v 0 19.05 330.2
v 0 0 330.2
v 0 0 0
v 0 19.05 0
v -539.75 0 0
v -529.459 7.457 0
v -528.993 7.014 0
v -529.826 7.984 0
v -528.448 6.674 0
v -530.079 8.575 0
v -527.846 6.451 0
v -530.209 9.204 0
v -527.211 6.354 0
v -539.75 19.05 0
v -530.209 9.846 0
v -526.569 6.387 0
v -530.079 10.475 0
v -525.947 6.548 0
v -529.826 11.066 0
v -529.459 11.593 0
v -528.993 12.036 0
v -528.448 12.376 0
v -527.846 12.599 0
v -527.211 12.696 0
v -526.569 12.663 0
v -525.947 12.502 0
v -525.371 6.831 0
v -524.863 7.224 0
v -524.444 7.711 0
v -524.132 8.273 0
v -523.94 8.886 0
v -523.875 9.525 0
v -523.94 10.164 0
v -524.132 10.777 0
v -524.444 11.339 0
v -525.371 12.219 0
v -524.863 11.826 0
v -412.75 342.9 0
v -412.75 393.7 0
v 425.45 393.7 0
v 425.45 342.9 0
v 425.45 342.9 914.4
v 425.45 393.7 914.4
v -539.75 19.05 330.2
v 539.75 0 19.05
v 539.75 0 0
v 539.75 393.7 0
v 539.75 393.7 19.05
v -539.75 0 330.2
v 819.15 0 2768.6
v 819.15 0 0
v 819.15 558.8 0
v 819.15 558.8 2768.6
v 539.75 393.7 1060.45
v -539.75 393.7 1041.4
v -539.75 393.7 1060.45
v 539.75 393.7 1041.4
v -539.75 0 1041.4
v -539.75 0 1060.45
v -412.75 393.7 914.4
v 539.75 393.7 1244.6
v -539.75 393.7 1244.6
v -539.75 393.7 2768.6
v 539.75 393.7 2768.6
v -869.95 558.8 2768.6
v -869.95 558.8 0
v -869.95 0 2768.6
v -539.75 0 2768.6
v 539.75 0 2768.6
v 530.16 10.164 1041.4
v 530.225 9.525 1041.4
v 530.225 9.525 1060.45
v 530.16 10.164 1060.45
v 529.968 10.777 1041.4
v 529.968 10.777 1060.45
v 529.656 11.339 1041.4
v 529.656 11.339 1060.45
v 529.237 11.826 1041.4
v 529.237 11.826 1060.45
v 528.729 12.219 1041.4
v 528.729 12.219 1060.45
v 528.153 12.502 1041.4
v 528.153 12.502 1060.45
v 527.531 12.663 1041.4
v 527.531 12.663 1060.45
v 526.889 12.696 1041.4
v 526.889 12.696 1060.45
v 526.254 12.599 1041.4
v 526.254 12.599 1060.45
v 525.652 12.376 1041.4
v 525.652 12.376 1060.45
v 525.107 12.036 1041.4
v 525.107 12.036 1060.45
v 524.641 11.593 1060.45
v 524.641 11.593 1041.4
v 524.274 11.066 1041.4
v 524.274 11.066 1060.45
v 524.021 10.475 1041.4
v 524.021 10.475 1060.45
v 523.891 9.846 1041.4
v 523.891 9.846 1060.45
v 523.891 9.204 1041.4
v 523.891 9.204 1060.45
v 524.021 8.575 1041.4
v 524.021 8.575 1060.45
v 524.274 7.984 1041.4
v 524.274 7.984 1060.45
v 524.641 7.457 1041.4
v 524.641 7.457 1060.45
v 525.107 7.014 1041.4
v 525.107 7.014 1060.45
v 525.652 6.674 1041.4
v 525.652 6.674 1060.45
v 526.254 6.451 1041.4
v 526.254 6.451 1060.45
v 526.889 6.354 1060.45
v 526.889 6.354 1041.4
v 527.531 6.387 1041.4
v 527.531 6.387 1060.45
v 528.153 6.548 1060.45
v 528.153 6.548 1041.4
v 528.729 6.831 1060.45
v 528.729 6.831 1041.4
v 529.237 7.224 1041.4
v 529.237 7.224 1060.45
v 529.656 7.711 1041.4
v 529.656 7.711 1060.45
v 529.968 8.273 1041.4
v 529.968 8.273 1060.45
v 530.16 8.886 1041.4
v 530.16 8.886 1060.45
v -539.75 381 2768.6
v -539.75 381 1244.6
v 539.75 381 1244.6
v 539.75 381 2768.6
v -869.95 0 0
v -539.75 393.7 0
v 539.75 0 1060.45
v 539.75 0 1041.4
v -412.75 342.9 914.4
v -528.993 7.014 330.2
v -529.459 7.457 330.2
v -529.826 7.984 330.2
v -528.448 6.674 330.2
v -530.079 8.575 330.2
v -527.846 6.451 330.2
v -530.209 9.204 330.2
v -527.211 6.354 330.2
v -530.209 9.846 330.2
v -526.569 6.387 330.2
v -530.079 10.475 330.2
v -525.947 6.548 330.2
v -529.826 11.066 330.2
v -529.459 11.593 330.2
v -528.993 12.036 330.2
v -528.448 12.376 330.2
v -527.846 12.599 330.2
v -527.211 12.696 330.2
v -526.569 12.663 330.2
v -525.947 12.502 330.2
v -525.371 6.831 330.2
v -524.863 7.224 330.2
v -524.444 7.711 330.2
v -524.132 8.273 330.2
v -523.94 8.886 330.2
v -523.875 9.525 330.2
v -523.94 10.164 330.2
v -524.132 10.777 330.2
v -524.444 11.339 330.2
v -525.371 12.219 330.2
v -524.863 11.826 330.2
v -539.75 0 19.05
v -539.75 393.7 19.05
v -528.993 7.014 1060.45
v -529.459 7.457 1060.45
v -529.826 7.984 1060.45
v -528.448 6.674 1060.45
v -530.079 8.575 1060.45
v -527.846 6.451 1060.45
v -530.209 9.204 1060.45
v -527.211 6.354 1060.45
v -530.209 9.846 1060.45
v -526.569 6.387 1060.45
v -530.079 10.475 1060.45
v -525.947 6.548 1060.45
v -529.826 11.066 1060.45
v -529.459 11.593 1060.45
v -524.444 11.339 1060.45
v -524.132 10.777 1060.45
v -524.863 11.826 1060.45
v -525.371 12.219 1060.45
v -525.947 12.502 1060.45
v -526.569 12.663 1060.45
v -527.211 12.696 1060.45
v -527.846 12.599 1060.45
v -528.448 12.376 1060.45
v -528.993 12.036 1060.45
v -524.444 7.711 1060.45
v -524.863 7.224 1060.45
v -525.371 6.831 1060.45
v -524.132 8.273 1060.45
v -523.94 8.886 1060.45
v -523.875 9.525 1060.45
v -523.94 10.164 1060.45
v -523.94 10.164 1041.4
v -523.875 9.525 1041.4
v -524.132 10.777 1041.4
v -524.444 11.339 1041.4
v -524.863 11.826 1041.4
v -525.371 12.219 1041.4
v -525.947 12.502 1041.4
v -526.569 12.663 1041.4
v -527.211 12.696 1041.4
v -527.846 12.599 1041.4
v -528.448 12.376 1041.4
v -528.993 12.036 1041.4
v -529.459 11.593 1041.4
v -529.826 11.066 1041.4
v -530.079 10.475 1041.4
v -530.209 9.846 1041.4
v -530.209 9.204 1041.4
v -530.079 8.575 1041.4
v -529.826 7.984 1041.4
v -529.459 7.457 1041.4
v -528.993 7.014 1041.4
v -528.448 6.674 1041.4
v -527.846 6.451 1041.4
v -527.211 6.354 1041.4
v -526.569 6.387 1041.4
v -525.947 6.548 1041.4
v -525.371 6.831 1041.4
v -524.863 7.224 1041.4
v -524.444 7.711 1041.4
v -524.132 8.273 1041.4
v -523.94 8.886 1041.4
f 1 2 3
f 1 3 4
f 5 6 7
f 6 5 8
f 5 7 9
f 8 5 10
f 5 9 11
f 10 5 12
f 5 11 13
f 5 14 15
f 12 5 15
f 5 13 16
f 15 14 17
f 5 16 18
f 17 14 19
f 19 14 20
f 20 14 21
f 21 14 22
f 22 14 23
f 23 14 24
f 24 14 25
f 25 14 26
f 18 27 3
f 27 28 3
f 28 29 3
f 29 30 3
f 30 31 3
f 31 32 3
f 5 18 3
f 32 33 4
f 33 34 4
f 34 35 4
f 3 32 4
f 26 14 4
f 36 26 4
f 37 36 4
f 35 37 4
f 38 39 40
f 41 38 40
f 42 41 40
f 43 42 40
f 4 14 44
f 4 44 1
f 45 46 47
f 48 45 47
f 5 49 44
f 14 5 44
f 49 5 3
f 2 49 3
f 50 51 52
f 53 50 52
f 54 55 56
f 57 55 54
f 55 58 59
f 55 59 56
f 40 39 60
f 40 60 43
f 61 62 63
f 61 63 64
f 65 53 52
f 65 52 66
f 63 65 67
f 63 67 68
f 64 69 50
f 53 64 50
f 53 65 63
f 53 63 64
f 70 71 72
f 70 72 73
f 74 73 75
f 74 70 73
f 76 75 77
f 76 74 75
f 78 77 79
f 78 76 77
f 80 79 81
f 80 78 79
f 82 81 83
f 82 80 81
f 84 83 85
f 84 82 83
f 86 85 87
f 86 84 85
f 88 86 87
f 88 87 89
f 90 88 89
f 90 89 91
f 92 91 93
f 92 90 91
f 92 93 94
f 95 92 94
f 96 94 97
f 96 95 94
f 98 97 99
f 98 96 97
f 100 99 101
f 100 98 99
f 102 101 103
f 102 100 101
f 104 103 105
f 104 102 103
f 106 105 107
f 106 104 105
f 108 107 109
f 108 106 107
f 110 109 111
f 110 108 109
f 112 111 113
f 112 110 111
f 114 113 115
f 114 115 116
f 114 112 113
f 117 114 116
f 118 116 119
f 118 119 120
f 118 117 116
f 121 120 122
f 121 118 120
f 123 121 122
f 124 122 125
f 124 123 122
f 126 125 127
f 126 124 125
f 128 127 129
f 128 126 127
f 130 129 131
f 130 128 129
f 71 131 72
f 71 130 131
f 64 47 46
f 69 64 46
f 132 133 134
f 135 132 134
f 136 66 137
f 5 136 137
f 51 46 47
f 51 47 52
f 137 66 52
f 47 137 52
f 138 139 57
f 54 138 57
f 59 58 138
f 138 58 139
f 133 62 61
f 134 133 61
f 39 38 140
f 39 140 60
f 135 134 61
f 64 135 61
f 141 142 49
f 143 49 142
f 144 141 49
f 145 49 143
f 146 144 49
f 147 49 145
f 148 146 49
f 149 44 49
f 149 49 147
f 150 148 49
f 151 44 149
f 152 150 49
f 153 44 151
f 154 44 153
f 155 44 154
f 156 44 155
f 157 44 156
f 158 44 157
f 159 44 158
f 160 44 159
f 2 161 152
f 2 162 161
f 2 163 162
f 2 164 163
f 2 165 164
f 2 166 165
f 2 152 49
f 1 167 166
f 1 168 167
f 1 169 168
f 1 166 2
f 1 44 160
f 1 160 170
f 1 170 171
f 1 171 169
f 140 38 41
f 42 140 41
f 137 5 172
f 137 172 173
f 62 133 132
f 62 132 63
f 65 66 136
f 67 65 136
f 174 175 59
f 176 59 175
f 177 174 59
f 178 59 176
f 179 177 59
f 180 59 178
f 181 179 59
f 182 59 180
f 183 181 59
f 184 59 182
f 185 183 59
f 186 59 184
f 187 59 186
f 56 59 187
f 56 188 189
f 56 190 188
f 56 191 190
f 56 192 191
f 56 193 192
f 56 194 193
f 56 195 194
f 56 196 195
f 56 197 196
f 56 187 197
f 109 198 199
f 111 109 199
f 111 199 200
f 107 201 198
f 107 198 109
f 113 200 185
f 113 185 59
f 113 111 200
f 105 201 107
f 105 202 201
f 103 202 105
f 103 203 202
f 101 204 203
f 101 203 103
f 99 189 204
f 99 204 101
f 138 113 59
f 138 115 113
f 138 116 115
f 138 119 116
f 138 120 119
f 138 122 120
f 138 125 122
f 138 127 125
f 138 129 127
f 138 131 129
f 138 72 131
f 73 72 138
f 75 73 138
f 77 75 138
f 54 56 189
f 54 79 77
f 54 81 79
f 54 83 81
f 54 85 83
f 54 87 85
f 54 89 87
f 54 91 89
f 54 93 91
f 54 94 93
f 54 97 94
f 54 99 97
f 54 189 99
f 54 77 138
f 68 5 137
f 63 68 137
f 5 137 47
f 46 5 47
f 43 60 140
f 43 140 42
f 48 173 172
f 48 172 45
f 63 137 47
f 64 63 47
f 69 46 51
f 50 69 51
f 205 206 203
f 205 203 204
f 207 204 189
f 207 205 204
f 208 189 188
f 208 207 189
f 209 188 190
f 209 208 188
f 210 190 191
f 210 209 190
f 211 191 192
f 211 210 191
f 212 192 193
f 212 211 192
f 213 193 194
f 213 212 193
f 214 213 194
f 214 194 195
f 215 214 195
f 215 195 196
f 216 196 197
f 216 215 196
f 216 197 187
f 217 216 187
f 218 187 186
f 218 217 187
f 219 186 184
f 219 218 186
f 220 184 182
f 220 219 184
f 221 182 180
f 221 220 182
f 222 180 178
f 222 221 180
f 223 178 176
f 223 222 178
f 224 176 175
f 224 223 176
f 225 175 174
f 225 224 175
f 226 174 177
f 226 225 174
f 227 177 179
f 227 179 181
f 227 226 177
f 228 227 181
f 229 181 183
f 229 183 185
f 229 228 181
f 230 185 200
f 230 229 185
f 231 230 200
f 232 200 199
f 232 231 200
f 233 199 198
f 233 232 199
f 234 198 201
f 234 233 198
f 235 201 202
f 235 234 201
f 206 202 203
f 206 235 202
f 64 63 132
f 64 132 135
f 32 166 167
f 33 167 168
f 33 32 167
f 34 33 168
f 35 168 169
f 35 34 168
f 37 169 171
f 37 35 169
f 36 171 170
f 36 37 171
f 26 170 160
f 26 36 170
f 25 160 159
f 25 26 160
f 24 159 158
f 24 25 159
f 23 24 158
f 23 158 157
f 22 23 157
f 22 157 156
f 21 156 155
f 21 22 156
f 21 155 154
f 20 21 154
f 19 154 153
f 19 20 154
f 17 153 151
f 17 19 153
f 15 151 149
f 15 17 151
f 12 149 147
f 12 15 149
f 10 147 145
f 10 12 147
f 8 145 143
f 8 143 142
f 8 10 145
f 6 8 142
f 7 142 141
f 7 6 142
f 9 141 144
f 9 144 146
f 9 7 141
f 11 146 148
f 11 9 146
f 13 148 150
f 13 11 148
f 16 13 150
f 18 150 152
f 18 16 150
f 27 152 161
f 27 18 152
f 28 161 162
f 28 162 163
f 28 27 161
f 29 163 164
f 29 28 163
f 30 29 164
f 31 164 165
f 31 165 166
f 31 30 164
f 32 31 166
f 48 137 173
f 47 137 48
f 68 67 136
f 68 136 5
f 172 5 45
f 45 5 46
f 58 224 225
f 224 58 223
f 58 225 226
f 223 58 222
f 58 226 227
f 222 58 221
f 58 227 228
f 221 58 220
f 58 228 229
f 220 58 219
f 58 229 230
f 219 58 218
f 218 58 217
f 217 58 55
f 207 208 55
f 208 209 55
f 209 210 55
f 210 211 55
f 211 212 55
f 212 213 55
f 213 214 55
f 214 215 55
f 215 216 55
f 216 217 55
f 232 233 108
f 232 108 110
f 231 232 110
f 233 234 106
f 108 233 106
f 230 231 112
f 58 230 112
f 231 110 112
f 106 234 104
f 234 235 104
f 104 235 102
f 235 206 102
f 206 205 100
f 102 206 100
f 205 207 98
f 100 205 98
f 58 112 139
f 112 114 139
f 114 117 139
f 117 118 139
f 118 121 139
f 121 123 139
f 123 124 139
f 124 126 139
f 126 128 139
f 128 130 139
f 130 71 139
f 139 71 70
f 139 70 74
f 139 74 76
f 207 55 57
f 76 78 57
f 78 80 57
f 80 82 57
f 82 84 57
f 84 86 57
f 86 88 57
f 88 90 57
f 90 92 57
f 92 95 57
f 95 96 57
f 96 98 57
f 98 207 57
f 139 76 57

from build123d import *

# Parameters (mm, degrees)
F1_DEPTH  = 2768.6
F3_START  = 1244.6
F2_W      = 1079.5
F2_H      = 12.7
F3_DEPTH  = 1524
F4_W      = 1079.5
F4_H      = 393.7
F5_DEPTH  = 19.05
F6_W      = 838.2
F6_H      = 50.8
F7_DEPTH  = 914.4
F9_START  = 1041.4
F8_W      = 1079.5
F8_H      = 393.7
F8_R      = 3.175
F9_DEPTH  = 19.05
F10_W     = 539.75
F10_H     = 19.05
F10_R     = 3.175
F11_DEPTH = 330.2


with BuildPart() as f1:
    # F0 (on Top) → F1 (new body)
    with BuildSketch(Plane.XY):
        Polygon((-539.75, 0), (-539.75, 393.7), (539.75, 393.7), (539.75, 0), (819.15, 0), (819.15, 558.8), (-869.95, 558.8), (-869.95, 0), align=None)
    extrude(amount=F1_DEPTH)


with BuildPart() as f3:
    # F2 (on face) → F3 (new body)
    with BuildSketch(Plane.XY.offset(F3_START)):
        with Locations((0, 387.35)):
            Rectangle(F2_W, F2_H)
    extrude(amount=F3_DEPTH)


with BuildPart() as f5:
    # F4 (on face) → F5 (new body)
    with BuildSketch(Plane.XY):
        with Locations((0, 196.85)):
            Rectangle(F4_W, F4_H)
    extrude(amount=F5_DEPTH)


with BuildPart() as f7:
    # F6 (on face) → F7 (new body)
    with BuildSketch(Plane.XY):
        with Locations((6.35, 368.3)):
            Rectangle(F6_W, F6_H)
    extrude(amount=F7_DEPTH)


with BuildPart() as f9:
    # F8 (on face) → F9 (new body)
    with BuildSketch(Plane.XY.offset(F9_START)):
        with Locations((0, 196.85)):
            Rectangle(F8_W, F8_H)
        with Locations((-527.05, 9.525)):
            Circle(F8_R, mode=Mode.SUBTRACT)
        with Locations((527.05, 9.525)):
            Circle(F8_R, mode=Mode.SUBTRACT)
    extrude(amount=F9_DEPTH)


with BuildPart() as f11:
    # F10 (on face) → F11 (new body)
    with BuildSketch(Plane.XY):
        with Locations((-269.875, 9.525)):
            Rectangle(F10_W, F10_H)
        with Locations((-527.05, 9.525)):
            Circle(F10_R, mode=Mode.SUBTRACT)
    extrude(amount=F11_DEPTH)


solid = Compound([f1.part, f3.part, f5.part, f7.part, f9.part, f11.part])
